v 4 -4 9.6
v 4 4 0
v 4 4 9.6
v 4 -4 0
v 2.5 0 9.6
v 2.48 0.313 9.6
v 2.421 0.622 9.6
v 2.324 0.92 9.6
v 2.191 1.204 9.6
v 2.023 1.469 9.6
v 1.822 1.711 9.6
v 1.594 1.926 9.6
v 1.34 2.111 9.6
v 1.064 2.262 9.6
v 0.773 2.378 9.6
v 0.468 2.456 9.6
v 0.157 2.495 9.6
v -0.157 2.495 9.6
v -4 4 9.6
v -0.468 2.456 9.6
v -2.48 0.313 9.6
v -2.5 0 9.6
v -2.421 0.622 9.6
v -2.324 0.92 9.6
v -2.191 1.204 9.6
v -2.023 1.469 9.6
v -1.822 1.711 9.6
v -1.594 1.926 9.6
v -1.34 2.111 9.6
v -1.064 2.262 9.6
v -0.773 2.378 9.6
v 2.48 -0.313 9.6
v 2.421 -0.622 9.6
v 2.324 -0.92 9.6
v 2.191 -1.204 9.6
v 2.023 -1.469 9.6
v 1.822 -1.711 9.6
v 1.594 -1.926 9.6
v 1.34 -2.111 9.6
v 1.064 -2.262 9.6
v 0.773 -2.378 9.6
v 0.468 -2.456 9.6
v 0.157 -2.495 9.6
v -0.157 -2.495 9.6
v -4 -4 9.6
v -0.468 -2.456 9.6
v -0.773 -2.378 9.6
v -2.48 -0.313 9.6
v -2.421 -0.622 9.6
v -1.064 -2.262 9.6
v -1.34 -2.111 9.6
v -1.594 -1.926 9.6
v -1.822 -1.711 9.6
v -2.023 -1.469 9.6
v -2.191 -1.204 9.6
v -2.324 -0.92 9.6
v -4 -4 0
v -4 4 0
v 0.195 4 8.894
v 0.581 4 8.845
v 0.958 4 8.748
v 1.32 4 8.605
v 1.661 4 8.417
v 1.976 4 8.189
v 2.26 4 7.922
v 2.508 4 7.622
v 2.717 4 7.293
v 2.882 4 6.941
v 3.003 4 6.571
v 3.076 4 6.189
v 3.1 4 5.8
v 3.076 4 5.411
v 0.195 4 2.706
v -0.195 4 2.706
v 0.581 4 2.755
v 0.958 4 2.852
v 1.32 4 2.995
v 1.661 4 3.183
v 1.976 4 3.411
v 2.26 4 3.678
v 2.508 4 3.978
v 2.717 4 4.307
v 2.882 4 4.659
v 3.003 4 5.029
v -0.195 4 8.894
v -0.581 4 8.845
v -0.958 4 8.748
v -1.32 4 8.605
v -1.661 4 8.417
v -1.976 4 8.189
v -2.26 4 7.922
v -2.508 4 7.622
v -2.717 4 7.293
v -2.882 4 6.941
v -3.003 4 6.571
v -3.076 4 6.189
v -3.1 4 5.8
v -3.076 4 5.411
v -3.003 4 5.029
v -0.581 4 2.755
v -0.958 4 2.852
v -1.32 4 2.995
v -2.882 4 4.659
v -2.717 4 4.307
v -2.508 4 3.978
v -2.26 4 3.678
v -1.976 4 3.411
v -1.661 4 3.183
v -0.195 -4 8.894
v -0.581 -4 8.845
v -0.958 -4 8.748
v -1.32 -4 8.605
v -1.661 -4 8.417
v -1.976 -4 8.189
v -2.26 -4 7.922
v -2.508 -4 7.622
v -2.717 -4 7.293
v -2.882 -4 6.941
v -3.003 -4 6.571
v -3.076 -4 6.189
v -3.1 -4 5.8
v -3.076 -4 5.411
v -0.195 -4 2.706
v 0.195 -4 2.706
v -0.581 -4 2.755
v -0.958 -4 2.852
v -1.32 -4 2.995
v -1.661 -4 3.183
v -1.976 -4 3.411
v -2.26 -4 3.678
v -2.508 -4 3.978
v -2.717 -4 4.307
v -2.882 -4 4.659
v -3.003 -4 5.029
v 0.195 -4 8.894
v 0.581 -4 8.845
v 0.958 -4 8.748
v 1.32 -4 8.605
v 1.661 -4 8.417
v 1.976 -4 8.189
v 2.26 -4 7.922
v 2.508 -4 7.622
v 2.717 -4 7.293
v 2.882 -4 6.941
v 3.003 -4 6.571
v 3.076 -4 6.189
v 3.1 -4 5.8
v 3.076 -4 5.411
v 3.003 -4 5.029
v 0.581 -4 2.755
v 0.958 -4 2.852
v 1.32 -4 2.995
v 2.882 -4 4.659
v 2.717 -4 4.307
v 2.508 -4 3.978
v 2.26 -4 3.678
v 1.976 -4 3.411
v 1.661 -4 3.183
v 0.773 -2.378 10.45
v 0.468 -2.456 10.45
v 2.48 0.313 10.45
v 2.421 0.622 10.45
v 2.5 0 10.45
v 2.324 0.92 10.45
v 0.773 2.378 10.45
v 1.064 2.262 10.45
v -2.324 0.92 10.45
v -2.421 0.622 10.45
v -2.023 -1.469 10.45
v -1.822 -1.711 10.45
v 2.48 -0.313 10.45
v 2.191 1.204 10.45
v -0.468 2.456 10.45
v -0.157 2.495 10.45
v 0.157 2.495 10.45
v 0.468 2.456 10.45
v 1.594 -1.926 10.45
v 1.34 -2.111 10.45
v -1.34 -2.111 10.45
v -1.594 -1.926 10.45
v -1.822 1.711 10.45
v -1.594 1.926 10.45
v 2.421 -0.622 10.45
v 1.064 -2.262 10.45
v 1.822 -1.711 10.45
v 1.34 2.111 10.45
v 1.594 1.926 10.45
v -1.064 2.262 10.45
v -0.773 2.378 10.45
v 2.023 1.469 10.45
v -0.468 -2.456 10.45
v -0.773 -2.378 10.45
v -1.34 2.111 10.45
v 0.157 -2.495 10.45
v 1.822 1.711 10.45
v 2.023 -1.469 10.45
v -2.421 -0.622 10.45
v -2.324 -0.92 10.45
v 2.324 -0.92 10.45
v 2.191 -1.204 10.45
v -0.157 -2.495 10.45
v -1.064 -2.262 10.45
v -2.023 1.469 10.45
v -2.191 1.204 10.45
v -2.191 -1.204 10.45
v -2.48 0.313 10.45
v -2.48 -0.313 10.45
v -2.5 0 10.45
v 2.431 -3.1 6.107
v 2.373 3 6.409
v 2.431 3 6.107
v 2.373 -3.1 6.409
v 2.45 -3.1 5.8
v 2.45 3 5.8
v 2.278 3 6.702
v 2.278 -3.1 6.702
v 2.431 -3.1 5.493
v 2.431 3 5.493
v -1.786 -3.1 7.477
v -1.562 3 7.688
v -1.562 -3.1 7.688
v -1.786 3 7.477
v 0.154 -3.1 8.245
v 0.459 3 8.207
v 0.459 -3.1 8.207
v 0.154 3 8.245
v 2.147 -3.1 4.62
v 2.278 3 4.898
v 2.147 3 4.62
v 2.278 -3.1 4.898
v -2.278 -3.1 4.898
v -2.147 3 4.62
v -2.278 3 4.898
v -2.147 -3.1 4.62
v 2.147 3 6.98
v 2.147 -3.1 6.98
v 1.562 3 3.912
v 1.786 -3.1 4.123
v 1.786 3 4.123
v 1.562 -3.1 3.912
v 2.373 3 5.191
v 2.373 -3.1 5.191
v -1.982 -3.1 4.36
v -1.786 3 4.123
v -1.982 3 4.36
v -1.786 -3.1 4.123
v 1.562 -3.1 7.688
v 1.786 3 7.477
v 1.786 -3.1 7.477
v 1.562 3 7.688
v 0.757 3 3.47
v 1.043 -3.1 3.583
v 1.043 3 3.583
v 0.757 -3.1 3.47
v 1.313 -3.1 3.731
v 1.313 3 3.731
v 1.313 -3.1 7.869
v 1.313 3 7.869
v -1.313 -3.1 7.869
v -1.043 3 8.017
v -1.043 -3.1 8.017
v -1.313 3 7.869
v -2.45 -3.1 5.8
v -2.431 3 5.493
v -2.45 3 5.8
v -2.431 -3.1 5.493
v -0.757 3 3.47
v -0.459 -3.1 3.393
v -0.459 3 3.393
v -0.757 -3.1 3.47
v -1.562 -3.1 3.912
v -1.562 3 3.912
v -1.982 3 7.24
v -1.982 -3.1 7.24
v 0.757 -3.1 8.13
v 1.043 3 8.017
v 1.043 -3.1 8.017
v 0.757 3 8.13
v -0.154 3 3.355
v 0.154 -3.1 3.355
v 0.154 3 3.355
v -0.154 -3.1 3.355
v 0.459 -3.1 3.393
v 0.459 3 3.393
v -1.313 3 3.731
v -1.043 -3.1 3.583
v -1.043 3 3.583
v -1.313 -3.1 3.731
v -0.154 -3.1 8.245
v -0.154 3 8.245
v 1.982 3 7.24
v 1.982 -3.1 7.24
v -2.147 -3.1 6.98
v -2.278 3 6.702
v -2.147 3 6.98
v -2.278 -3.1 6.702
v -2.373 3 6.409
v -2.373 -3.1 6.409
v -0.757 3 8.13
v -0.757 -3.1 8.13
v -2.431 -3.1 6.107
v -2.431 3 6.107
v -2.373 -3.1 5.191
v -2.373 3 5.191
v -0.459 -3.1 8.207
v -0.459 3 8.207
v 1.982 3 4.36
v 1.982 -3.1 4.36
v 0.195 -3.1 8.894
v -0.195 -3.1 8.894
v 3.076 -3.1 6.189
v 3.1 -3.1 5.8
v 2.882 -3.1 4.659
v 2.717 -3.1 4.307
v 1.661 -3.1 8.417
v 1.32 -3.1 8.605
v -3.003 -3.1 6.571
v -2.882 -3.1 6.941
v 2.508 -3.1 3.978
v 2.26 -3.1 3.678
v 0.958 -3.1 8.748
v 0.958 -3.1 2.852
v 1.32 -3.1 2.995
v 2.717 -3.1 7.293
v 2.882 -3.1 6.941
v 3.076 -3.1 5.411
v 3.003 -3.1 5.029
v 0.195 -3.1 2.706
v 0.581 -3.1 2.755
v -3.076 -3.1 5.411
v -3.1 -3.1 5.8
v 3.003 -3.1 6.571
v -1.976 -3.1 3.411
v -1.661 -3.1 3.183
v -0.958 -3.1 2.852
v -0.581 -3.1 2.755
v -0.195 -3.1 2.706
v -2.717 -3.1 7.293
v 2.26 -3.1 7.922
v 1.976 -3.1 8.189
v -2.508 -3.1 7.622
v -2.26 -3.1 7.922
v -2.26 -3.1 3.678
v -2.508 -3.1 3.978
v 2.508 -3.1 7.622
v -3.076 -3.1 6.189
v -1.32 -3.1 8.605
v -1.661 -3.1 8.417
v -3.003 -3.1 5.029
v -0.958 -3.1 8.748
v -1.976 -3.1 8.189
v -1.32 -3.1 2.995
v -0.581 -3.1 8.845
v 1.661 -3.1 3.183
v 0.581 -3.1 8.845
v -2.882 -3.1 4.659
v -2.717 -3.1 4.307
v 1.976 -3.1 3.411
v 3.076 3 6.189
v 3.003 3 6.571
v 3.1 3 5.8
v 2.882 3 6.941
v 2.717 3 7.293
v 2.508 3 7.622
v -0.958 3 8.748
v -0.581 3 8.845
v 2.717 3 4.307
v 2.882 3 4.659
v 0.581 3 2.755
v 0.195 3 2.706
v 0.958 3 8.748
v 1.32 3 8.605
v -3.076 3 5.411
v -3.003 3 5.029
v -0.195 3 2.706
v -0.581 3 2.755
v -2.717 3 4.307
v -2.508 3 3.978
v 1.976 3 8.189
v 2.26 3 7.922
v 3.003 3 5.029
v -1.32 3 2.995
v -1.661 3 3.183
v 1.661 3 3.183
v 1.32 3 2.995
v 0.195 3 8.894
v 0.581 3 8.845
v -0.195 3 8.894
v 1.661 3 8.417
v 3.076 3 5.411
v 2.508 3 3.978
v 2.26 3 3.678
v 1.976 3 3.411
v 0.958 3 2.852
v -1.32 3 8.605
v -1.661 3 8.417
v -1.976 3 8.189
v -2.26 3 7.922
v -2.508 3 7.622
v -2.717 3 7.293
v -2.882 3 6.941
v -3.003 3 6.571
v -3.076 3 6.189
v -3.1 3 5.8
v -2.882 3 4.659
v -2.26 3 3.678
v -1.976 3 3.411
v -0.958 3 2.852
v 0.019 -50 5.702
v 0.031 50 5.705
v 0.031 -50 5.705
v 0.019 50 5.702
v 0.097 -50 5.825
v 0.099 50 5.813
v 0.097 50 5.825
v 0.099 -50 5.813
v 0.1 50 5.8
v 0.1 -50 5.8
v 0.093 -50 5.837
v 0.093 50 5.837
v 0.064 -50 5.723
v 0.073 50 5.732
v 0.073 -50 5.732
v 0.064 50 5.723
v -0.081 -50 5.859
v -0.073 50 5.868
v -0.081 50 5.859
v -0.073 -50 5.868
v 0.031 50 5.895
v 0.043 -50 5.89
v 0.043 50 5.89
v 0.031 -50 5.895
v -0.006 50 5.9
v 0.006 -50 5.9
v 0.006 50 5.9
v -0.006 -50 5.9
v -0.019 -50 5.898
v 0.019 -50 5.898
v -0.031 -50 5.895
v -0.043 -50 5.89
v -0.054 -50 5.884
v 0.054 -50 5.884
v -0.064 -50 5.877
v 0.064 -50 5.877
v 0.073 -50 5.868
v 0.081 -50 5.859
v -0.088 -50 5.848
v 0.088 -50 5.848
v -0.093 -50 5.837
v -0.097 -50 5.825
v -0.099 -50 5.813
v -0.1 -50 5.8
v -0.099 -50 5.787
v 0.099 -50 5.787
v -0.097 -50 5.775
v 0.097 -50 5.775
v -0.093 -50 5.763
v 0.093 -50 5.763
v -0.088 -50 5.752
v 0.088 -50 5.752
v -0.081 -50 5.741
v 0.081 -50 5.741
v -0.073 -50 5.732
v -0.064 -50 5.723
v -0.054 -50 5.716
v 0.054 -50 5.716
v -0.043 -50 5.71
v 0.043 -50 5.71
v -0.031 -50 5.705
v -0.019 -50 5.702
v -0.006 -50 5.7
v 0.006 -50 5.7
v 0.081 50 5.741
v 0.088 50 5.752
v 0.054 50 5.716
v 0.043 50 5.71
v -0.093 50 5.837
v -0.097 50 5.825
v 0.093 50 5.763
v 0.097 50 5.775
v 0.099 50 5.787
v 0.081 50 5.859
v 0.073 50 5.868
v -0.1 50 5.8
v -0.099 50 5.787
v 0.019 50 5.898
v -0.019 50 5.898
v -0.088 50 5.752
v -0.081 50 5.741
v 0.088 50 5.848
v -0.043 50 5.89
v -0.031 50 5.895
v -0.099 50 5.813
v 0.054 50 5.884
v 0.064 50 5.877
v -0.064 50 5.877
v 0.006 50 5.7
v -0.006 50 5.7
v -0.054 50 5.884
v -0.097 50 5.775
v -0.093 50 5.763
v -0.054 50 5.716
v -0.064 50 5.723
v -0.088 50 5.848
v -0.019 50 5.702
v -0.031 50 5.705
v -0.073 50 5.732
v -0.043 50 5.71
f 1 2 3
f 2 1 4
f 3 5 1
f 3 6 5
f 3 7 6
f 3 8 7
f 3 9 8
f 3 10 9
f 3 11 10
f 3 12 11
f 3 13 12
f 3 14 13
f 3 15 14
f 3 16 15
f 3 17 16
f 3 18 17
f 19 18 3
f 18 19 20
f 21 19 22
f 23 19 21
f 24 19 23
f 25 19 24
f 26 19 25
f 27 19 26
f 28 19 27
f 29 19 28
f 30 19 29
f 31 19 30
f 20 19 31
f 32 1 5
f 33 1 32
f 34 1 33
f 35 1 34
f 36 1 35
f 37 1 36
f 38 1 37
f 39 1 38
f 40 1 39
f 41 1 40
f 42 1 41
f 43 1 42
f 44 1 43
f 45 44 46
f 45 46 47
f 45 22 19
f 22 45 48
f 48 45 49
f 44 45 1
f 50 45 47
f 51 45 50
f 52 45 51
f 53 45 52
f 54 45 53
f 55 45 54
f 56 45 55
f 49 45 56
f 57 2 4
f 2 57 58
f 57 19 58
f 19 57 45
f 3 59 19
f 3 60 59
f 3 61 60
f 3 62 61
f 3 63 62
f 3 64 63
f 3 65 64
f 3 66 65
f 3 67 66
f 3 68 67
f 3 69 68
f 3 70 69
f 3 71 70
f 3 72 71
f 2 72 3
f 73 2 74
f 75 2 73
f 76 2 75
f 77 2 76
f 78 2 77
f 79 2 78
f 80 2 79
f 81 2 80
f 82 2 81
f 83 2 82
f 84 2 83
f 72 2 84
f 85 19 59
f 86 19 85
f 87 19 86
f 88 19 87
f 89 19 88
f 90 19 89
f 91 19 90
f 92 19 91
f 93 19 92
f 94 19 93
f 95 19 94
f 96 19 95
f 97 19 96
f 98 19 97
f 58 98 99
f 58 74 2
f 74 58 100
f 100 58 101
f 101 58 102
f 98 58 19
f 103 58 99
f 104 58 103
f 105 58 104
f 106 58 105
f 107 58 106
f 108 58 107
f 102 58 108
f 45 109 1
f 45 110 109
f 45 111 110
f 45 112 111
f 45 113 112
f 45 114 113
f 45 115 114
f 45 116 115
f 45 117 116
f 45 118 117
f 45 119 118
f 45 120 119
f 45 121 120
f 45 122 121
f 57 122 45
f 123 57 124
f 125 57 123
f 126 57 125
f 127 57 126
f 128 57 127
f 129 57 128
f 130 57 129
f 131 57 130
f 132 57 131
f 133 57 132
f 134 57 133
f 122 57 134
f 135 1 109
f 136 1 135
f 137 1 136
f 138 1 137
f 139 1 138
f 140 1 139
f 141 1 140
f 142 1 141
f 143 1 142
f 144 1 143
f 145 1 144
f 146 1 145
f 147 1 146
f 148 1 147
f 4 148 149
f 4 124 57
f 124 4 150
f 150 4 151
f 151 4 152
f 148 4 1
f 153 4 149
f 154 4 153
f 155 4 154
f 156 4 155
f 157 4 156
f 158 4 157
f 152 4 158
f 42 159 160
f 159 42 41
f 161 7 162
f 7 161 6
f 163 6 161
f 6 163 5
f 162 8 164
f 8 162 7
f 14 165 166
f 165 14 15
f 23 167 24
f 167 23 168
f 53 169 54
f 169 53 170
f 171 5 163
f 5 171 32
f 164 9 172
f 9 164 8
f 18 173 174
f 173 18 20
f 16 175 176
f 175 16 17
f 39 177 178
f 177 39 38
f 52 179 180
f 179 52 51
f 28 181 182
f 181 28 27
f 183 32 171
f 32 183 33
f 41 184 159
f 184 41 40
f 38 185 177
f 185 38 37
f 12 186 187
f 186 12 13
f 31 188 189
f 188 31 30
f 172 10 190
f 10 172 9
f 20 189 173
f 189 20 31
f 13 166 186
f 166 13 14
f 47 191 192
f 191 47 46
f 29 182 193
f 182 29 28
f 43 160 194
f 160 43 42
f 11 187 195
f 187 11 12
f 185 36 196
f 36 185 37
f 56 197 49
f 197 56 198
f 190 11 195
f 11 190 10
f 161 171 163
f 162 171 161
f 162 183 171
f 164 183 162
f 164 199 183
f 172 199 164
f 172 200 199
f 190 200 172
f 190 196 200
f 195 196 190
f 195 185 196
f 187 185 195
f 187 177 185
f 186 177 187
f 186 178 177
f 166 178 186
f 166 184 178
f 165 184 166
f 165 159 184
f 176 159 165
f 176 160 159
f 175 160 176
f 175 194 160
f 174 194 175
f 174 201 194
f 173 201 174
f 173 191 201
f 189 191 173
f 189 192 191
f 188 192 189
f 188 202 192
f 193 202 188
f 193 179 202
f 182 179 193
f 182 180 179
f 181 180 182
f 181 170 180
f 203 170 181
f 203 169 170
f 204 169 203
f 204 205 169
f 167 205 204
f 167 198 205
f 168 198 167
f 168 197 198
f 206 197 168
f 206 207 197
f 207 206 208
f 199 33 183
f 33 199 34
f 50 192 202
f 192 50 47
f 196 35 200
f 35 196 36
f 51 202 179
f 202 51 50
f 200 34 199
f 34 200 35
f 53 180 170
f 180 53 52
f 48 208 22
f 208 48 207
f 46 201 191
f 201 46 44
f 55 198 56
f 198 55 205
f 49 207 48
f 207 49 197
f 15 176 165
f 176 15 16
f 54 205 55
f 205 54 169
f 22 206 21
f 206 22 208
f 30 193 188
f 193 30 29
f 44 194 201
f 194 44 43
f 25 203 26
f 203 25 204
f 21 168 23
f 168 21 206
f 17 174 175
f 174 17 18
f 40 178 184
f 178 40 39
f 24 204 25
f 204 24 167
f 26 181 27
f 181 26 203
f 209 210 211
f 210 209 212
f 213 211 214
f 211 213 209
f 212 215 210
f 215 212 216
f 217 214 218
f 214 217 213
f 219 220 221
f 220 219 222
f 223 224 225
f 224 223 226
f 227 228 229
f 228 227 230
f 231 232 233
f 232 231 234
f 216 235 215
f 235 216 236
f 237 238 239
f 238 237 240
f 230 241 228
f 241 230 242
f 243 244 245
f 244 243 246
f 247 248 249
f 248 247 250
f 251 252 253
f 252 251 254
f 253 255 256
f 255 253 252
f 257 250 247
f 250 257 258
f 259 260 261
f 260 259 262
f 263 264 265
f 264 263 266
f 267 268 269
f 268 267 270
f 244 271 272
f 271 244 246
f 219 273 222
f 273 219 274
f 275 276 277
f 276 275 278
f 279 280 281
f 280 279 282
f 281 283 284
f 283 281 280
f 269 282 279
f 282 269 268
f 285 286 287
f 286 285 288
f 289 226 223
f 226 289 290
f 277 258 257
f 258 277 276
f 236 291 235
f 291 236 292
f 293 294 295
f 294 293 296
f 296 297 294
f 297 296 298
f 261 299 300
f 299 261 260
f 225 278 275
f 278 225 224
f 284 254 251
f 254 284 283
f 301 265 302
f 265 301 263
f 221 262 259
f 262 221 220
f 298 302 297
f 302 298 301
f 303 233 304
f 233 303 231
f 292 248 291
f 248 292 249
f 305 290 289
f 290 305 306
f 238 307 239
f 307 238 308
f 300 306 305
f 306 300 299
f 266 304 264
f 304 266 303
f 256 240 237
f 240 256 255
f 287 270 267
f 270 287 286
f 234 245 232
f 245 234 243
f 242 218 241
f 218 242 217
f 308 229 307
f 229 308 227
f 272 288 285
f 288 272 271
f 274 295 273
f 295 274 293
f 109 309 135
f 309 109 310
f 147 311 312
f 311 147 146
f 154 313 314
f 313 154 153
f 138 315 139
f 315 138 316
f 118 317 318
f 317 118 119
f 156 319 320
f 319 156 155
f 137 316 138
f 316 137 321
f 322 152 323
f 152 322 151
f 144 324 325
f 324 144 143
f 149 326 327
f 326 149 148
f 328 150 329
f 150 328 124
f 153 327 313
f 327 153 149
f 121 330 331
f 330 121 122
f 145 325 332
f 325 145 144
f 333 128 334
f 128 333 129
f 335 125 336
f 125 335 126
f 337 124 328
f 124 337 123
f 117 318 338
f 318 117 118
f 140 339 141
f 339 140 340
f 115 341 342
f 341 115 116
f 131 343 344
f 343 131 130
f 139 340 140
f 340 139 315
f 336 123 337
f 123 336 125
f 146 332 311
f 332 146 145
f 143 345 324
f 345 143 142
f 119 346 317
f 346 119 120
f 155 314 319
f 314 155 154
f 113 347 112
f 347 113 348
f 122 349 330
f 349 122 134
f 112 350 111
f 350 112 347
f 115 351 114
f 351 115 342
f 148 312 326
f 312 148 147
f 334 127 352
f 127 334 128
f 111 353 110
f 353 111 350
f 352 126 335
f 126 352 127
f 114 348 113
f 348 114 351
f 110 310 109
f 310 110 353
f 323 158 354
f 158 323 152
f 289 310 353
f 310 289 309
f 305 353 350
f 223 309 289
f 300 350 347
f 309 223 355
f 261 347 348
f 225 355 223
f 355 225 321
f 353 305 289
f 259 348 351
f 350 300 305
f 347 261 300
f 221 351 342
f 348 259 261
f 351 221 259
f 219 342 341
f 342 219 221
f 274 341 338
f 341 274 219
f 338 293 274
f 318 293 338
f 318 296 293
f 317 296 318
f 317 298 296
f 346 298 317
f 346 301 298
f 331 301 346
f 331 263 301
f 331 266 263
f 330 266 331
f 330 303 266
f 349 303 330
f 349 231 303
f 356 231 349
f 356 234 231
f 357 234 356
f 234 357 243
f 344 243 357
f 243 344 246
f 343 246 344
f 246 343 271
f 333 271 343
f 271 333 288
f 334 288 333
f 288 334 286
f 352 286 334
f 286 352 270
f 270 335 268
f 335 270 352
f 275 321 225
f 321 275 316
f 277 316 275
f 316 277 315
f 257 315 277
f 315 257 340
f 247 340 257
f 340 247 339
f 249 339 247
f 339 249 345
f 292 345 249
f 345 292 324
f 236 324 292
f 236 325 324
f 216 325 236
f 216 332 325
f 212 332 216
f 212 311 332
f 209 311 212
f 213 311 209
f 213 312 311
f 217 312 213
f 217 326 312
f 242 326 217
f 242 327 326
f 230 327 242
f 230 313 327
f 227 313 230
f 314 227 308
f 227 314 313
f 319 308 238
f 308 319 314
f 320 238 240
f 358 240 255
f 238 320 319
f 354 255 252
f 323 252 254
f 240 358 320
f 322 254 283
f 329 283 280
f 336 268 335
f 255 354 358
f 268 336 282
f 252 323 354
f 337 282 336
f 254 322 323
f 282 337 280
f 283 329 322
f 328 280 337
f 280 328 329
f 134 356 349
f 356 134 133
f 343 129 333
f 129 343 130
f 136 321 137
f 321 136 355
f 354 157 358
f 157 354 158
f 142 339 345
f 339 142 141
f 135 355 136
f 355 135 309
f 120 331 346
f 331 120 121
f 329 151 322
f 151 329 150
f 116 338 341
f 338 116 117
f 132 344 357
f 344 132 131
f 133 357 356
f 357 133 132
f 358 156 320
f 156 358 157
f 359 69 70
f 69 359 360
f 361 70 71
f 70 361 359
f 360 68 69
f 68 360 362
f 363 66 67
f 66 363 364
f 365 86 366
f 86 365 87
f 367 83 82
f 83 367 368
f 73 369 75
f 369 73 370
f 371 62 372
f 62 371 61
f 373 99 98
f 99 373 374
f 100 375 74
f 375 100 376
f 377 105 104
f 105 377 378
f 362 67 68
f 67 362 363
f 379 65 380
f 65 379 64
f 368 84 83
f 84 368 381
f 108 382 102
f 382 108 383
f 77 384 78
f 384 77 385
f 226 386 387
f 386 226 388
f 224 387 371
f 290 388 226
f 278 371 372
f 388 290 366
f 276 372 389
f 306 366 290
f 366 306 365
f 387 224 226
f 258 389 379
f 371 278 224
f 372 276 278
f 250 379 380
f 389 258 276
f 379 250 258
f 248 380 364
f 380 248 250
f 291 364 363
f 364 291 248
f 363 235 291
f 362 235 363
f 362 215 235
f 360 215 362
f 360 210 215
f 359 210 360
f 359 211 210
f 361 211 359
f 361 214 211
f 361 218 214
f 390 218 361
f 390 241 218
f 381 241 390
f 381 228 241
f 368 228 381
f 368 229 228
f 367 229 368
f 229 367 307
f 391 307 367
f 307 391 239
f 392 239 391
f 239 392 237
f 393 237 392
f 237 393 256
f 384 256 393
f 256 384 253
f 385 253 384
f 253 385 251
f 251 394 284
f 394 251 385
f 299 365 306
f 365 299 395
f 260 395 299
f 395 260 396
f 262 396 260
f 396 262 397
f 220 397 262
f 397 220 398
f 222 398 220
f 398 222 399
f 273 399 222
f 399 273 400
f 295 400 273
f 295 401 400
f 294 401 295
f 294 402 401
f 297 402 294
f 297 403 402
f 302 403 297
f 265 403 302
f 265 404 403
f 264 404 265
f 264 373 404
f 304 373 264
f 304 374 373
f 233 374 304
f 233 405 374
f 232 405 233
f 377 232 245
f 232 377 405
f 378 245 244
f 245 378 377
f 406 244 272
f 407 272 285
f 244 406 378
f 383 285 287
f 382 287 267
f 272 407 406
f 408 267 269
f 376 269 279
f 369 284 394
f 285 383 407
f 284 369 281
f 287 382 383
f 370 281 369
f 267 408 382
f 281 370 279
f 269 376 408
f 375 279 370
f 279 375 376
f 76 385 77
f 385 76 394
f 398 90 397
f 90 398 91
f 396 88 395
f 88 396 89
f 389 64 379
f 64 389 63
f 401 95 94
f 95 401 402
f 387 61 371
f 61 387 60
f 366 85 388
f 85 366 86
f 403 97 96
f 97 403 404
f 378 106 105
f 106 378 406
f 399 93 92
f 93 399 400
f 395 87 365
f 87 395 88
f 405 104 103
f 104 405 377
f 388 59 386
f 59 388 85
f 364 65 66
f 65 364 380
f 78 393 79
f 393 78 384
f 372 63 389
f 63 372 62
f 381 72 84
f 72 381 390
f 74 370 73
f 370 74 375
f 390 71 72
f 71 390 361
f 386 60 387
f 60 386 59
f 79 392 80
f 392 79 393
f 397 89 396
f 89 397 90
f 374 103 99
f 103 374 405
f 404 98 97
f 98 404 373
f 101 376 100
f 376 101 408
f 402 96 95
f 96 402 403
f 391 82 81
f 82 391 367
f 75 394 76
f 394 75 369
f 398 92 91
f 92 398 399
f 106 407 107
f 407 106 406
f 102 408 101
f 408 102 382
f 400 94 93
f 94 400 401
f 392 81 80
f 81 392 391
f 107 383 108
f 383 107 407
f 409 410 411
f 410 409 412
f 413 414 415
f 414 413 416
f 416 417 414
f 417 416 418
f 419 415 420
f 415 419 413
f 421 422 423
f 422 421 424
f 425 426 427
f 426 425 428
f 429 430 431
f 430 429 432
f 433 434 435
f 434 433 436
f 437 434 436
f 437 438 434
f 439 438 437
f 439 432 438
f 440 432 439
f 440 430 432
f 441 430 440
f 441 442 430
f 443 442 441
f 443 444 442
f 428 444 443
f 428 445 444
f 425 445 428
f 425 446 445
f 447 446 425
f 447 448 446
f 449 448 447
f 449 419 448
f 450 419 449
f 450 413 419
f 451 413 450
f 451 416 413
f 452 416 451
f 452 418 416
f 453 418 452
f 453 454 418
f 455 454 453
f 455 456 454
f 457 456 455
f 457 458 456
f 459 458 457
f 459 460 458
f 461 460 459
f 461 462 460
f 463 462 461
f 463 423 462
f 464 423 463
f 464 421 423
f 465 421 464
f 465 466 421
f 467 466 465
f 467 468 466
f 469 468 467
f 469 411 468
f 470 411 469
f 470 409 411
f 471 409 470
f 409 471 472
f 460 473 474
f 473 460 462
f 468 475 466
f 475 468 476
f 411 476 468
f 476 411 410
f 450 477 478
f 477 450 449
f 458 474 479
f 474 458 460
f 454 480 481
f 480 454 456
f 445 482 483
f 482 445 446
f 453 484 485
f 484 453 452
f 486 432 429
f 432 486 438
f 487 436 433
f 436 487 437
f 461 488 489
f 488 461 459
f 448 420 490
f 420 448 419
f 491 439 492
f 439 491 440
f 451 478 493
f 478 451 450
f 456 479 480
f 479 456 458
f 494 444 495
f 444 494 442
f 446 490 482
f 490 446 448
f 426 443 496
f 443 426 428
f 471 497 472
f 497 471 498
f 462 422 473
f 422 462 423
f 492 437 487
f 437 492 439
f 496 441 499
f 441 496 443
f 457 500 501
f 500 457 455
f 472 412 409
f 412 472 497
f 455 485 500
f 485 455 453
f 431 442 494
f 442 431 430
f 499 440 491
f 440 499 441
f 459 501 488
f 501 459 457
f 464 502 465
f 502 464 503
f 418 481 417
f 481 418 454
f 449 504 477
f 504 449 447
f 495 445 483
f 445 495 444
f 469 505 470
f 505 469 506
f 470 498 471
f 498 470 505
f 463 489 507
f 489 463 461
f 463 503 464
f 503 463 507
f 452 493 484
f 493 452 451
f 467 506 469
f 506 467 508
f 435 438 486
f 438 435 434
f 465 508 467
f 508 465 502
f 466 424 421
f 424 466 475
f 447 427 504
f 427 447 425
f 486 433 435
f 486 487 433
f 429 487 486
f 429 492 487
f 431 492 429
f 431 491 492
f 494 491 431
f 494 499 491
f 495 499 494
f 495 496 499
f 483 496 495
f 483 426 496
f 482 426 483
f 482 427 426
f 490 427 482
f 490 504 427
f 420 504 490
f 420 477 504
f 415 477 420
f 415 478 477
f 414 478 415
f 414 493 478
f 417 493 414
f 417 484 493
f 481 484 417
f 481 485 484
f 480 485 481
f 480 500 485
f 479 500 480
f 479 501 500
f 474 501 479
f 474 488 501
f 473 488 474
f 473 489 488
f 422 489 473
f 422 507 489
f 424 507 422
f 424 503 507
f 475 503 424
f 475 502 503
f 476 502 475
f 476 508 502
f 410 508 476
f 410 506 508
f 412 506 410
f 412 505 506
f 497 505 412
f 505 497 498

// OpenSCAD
// file: ../general.scad
echo ("general.scad");

tolleranceForUnionDifference = 0.1;

function enlarge(height = 0) = height + tolleranceForUnionDifference ;

function enlargeFrontBack(height = 0) = height + tolleranceForUnionDifference * 2 ;
// main file
use <../general.scad>;

$fn=50;

legoHeight = 9.6;
legoWidth = 8;

function xLegoStep(step) = step * legoWidth; 
function yLegoStep(step) = step * legoWidth; 
function zLegoStep(step) = step * legoHeight; 
function zLegoHole() = 5.8; 

module _legoBrick(hole = false, knob = true) {
	difference() {
		union() {
			translate([ - legoWidth / 2, - legoWidth / 2, - legoHeight / 2]) {
				cube ([ legoWidth, legoWidth, legoHeight]);
			}
			if (knob) {
				translate([ 0, 0 ,  legoHeight / 2]) {
					cylinder(h = 1.7, r = 5/2);
				}
			}
		}
		if (hole) {
			translate([0, 0, (zLegoHole() - (legoHeight / 2)) / 2]) {
				rotate([90, 0, 0]) {
					translate([ 0, 0, - (legoWidth - 0.9 * 2) / 2 ]) {
						cylinder(h = enlargeFrontBack(legoWidth - 0.9 * 2), r= 4.9 / 2 );
					}
					
					translate([ 0, 0, (legoWidth - 0.9 * 2) / 2]) {
						cylinder(h = enlargeFrontBack(0.9), r= 6.2 / 2 );
					}
					translate([ 0, 0, - (legoWidth - 0.9 * 2) / 2 - enlarge(0.9)]) {
						cylinder(h = enlargeFrontBack(0.9), r= 6.2 / 2 );
					}
				}
			}
		}
	}
}

module legoBrick(hole = false, knob = true) {
		difference() {
			union() {
				cube ([ legoWidth, legoWidth, legoHeight], center = true);
				if (knob) {
					translate([ 0, 0 ,  legoHeight / 2]) {
						cylinder(h = 1.7, r = 5/2, center = true);
					}
				}
			}
			if (hole) {
				translate([0, 0, zLegoHole() - legoHeight / 2]) {
					rotate([90, 0, 0]) {
						translate([ 0, 0, - (legoWidth - 0.9 * 2) / 2 ]) {
							cylinder(h = enlargeFrontBack(legoWidth - 0.9 * 2), r= 4.9 / 2 );
						}
						
						translate([ 0, 0, (legoWidth - 0.9 * 2) / 2]) {
							cylinder(h = enlargeFrontBack(0.9), r= 6.2 / 2 );
						}
						translate([ 0, 0, - (legoWidth - 0.9 * 2) / 2 - enlarge(0.9)]) {
							cylinder(h = enlargeFrontBack(0.9), r= 6.2 / 2 );
						}
					}
				}
			}
		}
	
}

module legoSupport(hole = true, knob = true) {
	translate([0, 0, 2.5 / 2]) {
		assign (legoHeight = legoHeight - 2.5) {
			difference() {
				union() {
					translate([ - legoWidth / 2, - legoWidth / 2, - legoHeight / 2]) {
						cube ([ legoWidth, legoWidth, legoHeight]);
					}
					if (knob) {
						translate([ 0, 0 ,  legoHeight / 2]) {
							cylinder(h = 1.7, r = 5/2);
						}
					}
				}
				if (hole) {
					translate([0, 0, 0]) {
						rotate([90, 0, 0]) {
							translate([ 0, 0, - (legoWidth - 0.9 * 2) / 2 ]) {
								cylinder(h = enlargeFrontBack(legoWidth - 0.9 * 2), r= 4.9 / 2 );
							}
							
							translate([ 0, 0, (legoWidth - 0.9 * 2) / 2]) {
								cylinder(h = enlargeFrontBack(0.9), r= 6.2 / 2 );
							}
							translate([ 0, 0, - (legoWidth - 0.9 * 2) / 2 - enlarge(0.9)]) {
								cylinder(h = enlargeFrontBack(0.9), r= 6.2 / 2 );
							}
						}
					}
				}
			}
		}
	}
}

module legoAxle(length = 1) {
		intersection() {
			cylinder(h = length * legoHeight, r = 4.8 / 2, center=true);
			union() {
				cube([5 , 2, length * legoHeight],center=true);
				cube([2, 5 ,	length * legoHeight],center=true);
			}
		}
}

translate([xLegoStep(2.5), yLegoStep(0), zLegoStep(0)]) {
	legoBrick(hole = true, knob = false);
}
translate([xLegoStep(1), yLegoStep(0), zLegoStep(0)]) {
	legoBrick(hole = true);
}

translate([xLegoStep(-1), yLegoStep(0), zLegoStep(0)]) {
	legoSupport();
}

translate([xLegoStep(-2.5), yLegoStep(0), zLegoStep(0)]) {
	legoSupport(knob = false);
}

legoAxle(3);

!union() {
		translate([0, 0, zLegoStep(0.5)]) legoBrick(hole = true, knob = true);

	 translate([0, 50, zLegoHole()]) rotate([90, 0, 0]) cylinder(h = 100, r = 0.1);
}
